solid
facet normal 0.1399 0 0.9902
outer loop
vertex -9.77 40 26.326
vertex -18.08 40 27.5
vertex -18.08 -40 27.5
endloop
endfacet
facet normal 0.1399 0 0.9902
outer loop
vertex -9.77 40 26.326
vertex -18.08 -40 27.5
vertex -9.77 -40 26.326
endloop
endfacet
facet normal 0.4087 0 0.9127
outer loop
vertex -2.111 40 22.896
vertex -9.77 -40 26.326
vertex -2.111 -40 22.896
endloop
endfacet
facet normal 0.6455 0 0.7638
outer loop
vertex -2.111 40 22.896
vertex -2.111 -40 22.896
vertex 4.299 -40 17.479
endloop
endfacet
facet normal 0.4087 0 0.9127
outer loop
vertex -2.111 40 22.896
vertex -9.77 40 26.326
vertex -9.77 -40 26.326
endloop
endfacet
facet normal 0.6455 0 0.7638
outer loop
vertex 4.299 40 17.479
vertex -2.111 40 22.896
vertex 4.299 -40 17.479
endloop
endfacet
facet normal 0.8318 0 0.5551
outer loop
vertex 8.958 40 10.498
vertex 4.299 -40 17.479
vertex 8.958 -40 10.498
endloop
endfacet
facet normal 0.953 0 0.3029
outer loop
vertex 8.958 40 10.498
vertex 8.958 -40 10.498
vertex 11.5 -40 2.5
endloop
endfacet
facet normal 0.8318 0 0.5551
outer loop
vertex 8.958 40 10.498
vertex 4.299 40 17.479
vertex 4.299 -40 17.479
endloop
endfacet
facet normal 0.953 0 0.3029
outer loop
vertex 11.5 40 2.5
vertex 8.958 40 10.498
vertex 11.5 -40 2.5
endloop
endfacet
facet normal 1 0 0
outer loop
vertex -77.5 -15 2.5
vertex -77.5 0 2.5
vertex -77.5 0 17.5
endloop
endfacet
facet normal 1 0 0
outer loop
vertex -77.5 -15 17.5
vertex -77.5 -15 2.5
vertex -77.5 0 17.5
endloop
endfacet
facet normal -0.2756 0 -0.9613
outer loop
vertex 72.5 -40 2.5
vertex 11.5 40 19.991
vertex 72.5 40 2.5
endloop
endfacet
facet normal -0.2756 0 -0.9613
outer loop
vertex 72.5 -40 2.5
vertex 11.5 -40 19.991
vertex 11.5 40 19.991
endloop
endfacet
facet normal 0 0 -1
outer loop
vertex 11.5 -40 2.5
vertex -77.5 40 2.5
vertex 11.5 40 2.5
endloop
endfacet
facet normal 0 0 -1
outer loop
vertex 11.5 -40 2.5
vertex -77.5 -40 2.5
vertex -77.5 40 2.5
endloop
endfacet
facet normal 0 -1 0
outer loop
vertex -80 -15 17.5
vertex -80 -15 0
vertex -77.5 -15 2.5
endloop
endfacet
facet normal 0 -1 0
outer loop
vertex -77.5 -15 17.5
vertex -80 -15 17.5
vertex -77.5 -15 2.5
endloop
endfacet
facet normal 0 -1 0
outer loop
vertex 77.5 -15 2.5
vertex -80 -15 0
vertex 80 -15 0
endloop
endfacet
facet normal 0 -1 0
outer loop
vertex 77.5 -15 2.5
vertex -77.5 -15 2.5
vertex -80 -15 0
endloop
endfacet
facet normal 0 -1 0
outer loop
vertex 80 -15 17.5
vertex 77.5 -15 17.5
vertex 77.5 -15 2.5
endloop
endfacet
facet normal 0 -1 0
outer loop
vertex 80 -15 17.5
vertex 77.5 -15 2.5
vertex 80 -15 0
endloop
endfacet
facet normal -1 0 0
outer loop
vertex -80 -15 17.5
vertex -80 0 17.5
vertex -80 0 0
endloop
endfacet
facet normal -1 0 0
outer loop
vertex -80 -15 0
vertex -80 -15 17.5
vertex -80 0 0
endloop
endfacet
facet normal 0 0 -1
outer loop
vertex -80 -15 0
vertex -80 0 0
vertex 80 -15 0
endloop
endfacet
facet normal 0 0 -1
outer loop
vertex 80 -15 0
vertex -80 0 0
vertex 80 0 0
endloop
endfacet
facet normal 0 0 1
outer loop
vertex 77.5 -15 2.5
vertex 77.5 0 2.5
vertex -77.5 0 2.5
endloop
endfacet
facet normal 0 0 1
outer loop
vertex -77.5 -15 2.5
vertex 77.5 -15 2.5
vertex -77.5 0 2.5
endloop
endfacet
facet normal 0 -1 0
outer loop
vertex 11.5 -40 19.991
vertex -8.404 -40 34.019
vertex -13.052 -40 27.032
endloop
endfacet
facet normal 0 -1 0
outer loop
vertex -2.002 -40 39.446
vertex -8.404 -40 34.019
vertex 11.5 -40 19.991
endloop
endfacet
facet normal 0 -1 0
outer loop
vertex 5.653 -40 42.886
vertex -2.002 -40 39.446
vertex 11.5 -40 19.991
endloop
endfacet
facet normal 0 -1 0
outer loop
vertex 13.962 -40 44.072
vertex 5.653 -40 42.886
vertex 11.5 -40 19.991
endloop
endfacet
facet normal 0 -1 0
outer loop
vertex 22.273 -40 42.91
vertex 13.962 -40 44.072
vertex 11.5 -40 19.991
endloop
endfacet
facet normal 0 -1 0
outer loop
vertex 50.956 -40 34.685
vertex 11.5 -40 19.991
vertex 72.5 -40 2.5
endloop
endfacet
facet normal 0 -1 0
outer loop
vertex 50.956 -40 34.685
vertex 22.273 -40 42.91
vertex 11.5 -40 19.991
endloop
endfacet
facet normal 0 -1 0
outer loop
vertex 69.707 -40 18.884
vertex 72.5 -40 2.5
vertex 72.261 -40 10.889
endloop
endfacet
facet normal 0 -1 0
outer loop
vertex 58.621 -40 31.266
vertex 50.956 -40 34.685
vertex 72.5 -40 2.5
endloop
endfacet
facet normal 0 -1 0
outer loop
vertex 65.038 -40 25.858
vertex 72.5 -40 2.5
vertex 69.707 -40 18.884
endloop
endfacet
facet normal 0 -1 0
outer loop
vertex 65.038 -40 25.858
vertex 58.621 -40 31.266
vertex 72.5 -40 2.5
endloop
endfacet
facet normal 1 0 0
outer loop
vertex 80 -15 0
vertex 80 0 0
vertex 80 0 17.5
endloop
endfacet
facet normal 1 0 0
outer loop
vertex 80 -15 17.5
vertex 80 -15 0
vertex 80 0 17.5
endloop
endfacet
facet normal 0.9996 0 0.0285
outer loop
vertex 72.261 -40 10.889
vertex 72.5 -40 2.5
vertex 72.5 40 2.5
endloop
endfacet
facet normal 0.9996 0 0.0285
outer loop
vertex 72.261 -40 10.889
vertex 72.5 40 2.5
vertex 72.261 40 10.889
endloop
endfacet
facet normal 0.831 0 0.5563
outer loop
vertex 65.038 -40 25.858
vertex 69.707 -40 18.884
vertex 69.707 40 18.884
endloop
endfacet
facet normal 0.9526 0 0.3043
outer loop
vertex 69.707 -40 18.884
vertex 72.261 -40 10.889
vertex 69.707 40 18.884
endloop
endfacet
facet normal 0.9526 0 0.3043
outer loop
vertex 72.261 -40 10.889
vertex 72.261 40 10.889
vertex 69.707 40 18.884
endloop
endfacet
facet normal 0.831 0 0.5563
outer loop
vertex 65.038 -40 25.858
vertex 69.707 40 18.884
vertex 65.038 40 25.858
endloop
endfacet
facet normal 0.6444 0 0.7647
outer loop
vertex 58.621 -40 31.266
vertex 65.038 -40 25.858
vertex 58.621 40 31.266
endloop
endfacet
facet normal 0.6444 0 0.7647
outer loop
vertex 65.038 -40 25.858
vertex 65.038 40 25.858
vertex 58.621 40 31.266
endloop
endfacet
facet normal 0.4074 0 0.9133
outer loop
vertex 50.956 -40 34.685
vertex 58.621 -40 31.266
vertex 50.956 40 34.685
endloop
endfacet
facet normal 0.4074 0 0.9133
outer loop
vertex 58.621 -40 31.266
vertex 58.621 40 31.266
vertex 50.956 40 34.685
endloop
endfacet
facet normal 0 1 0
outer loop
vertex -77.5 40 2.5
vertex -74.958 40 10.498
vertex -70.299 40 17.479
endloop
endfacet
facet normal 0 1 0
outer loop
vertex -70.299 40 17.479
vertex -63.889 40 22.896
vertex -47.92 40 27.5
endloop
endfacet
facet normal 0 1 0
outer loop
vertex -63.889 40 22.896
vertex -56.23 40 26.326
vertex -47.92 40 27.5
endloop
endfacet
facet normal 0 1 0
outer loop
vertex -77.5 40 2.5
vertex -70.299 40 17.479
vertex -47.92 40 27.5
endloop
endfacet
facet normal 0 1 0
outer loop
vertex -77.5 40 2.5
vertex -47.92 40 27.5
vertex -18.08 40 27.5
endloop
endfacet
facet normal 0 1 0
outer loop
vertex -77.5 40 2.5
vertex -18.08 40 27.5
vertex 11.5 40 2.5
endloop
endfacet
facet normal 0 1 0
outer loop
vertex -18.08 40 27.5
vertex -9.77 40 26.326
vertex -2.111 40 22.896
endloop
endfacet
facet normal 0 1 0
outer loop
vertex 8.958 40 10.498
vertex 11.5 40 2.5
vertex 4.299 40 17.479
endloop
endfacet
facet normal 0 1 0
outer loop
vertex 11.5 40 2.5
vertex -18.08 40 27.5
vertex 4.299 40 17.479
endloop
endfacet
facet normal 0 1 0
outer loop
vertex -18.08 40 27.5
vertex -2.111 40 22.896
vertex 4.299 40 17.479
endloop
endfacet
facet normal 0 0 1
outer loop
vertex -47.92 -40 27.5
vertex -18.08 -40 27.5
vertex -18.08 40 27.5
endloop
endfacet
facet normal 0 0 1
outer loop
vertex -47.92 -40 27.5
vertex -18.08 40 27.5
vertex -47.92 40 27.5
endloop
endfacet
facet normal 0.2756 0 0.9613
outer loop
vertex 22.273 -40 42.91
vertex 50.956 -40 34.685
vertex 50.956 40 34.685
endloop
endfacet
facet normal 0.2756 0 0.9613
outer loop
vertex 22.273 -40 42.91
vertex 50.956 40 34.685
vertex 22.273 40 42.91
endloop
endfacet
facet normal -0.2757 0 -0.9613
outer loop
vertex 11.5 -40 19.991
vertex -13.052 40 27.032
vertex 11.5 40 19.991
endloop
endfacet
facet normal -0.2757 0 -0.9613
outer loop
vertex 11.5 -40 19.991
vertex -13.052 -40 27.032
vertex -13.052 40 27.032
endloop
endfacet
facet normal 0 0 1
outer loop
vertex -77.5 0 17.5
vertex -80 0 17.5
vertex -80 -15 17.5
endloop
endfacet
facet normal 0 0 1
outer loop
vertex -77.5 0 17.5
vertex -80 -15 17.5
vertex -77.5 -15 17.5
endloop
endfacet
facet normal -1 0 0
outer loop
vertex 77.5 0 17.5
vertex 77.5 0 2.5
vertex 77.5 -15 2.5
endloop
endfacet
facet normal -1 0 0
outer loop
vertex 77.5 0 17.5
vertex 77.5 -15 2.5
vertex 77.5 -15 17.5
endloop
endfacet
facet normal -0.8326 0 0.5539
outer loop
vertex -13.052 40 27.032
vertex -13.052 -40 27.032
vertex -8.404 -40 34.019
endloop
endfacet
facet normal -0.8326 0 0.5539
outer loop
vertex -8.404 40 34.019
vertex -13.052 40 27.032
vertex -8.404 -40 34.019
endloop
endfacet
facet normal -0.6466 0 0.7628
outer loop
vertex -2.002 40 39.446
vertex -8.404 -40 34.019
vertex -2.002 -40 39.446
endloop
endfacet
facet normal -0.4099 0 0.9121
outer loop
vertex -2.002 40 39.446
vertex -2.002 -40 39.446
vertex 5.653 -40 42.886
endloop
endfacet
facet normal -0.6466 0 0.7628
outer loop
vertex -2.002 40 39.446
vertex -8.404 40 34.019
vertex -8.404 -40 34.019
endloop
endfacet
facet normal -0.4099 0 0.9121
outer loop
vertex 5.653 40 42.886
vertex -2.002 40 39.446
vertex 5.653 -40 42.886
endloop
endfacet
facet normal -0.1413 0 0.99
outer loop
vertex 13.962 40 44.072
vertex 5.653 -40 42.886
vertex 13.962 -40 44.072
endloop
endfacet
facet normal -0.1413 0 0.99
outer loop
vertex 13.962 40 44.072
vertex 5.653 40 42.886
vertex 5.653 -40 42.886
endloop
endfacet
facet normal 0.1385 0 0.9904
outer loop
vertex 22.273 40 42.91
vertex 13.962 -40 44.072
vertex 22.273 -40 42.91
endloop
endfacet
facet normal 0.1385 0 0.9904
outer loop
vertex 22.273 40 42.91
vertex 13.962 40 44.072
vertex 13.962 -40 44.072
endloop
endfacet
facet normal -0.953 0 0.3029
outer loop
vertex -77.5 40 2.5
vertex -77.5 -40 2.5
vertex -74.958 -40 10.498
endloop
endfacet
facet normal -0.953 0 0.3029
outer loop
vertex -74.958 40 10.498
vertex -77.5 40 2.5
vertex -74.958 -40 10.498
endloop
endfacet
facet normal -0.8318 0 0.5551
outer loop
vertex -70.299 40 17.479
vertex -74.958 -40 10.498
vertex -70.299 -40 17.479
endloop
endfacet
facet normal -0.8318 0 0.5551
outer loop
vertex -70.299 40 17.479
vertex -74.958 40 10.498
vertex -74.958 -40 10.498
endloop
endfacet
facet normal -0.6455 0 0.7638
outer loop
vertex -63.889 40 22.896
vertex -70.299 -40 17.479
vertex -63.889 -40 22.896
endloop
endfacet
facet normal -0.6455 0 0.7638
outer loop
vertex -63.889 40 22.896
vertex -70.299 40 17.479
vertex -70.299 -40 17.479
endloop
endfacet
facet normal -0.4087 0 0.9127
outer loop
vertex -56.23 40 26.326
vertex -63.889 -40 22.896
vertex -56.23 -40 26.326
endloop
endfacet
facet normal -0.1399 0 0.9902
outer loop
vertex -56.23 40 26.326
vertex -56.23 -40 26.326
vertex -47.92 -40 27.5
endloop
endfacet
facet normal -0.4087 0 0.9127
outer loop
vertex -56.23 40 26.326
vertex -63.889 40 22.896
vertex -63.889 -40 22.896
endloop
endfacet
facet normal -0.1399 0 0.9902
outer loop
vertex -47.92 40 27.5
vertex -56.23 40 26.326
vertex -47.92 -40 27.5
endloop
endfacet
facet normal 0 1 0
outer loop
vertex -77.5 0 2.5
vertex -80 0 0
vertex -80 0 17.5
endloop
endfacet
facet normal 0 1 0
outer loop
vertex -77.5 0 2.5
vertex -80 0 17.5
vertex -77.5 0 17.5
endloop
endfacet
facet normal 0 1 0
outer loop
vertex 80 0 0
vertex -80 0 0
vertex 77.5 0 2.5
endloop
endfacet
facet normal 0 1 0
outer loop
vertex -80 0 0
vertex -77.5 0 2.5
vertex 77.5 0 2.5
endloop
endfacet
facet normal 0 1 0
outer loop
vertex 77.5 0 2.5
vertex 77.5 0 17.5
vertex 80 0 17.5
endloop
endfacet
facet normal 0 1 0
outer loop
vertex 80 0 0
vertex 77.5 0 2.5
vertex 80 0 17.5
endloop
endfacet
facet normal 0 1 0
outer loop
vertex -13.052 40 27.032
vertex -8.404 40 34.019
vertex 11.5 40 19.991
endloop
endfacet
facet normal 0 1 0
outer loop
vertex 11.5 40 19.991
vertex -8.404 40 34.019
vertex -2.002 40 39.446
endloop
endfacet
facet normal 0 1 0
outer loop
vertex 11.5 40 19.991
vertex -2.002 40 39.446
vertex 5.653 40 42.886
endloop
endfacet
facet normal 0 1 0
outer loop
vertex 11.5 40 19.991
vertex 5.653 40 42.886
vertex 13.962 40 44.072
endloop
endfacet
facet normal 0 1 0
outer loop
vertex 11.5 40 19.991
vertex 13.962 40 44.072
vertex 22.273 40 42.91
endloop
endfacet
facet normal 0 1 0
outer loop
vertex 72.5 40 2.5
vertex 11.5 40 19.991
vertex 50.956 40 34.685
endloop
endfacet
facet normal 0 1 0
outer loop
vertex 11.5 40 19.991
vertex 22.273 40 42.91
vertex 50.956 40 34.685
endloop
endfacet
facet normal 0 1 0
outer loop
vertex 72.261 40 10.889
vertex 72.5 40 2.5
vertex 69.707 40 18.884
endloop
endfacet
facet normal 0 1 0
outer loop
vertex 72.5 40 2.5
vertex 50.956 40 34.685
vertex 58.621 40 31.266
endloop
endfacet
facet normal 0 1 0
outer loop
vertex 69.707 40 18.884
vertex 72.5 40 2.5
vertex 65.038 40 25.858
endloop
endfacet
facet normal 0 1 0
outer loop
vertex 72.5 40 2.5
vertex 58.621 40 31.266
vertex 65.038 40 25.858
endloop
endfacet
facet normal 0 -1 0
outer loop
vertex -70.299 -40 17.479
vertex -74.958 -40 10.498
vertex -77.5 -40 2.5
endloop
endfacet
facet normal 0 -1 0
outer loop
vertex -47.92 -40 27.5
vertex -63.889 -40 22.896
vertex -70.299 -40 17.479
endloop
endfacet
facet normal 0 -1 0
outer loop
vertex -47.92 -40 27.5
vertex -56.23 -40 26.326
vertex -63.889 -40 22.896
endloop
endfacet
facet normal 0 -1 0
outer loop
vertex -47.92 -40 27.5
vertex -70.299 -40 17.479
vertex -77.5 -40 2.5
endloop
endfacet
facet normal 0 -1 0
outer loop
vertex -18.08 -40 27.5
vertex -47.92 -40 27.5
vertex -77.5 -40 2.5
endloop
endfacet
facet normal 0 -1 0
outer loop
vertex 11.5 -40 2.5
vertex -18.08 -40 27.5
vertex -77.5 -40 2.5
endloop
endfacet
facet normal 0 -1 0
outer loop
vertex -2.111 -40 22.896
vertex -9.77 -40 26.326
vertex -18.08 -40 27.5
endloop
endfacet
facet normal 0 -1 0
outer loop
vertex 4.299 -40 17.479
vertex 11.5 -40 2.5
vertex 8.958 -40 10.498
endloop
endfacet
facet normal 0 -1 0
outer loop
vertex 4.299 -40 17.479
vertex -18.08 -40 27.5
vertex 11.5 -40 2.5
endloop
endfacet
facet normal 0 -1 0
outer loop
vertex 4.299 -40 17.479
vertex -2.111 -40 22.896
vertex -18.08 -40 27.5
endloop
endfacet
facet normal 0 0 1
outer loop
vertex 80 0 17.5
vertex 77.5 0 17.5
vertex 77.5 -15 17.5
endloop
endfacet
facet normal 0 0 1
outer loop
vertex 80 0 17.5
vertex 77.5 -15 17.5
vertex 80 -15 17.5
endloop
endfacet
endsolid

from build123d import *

# Parameters (mm, degrees)
F0_W        = 2.5
F0_H        = 15
F0_H_2      = 2.5
F1_DEPTH    = 15
F2_DEPTH    = 40
F3_T1_DEPTH = 227.9019945775
F4_DEPTH    = 40
F5_T1_DEPTH = 227.9019945775


# Not quite as in the source:
# - a fillet or chamfer that OpenCascade refuses, or shapes differently, is made with other operations: its cross-section is extruded or revolved along the edge and cut away or added


with BuildPart() as f1:
    # F0 (on Front) → F1 (new body)
    with BuildSketch(Plane.XZ):
        with Locations((-78.75, 10)):
            Rectangle(F0_W, F0_H)
        Polygon((-80, 2.5), (-80, 0), (77.5, 0), (77.5, 2.5), (72.5, 2.5), (11.5, 2.5), (-77.5, 2.5), align=None)
        with Locations((78.75, 1.25)):
            Rectangle(F0_W, F0_H_2)
        with Locations((78.75, 10)):
            Rectangle(F0_W, F0_H)
    extrude(amount=F1_DEPTH)


with BuildPart() as f2:
    # F0 (on Front) → F2 (new body, symmetric)
    with BuildSketch(Plane.XZ):
        Polygon((-77.5, 17.5), (-77.5, 2.5), (11.5, 2.5), (11.5, 19.9914685313), (-13.0522909385, 27.0317246677), (-12.9180151477, 27.5), (-77.5, 27.5), align=None)
        Polygon((-13.0522909385, 27.0317246677), (11.5, 19.9914685313), (11.5, 27.5), (-12.9180151477, 27.5), align=None)
    extrude(amount=F2_DEPTH, both=True)

    # F3: fillet of radius 30 on 2 edges, made by hand

    # F3_s2 → F3_t1 (cut)
    with BuildSketch(Plane.XZ.offset(-113.9509972888)):
        with BuildLine():
            ThreePointArc((-77.5, 2.5), (-67.2845178155, 20.4128784748), (-47.9196010845, 27.5))
            Line((-47.9196010845, 27.5), (-77.5, 27.5))
            Line((-77.5, 27.5), (-77.5, 2.5))
        make_face()
        with BuildLine():
            ThreePointArc((-18.0803989155, 27.5), (1.2845178155, 20.4128784748), (11.5, 2.5))
            Line((11.5, 2.5), (11.5, 27.5))
            Line((11.5, 27.5), (-18.0803989155, 27.5))
        make_face()
    extrude(amount=F3_T1_DEPTH, mode=Mode.SUBTRACT)


with BuildPart() as f4:
    # F0 (on Front) → F4 (new body, symmetric)
    with BuildSketch(Plane.XZ):
        Polygon((11.5, 19.9914685313), (72.5, 2.5), (79.3909338954, 26.5315423985), (-6.1613570431, 51.0632670662), (-12.9180151477, 27.5), (11.5, 27.5), align=None)
        Polygon((-13.0522909385, 27.0317246677), (11.5, 19.9914685313), (11.5, 27.5), (-12.9180151477, 27.5), align=None)
    extrude(amount=F4_DEPTH, both=True)

    # F5: fillet of radius 30 on 2 edges, made by hand

    # F5_s2 → F5_t1 (cut)
    with BuildSketch(Plane.XZ.offset(-113.9509972888)):
        with BuildLine():
            ThreePointArc((-13.0522909385, 27.0317246677), (1.7049192488, 41.4349201118), (22.273147385, 42.9098041251))
            Line((22.273147385, 42.9098041251), (-6.1613570431, 51.0632670662))
            Line((-6.1613570431, 51.0632670662), (-13.0522909385, 27.0317246677))
        make_face()
        with BuildLine():
            ThreePointArc((72.5, 2.5), (67.6177067284, 22.5347324395), (50.9564294674, 34.6850053395))
            Line((50.9564294674, 34.6850053395), (79.3909338954, 26.5315423985))
            Line((79.3909338954, 26.5315423985), (72.5, 2.5))
        make_face()
    extrude(amount=F5_T1_DEPTH, mode=Mode.SUBTRACT)


solid = Compound([f1.part, f2.part, f4.part])
